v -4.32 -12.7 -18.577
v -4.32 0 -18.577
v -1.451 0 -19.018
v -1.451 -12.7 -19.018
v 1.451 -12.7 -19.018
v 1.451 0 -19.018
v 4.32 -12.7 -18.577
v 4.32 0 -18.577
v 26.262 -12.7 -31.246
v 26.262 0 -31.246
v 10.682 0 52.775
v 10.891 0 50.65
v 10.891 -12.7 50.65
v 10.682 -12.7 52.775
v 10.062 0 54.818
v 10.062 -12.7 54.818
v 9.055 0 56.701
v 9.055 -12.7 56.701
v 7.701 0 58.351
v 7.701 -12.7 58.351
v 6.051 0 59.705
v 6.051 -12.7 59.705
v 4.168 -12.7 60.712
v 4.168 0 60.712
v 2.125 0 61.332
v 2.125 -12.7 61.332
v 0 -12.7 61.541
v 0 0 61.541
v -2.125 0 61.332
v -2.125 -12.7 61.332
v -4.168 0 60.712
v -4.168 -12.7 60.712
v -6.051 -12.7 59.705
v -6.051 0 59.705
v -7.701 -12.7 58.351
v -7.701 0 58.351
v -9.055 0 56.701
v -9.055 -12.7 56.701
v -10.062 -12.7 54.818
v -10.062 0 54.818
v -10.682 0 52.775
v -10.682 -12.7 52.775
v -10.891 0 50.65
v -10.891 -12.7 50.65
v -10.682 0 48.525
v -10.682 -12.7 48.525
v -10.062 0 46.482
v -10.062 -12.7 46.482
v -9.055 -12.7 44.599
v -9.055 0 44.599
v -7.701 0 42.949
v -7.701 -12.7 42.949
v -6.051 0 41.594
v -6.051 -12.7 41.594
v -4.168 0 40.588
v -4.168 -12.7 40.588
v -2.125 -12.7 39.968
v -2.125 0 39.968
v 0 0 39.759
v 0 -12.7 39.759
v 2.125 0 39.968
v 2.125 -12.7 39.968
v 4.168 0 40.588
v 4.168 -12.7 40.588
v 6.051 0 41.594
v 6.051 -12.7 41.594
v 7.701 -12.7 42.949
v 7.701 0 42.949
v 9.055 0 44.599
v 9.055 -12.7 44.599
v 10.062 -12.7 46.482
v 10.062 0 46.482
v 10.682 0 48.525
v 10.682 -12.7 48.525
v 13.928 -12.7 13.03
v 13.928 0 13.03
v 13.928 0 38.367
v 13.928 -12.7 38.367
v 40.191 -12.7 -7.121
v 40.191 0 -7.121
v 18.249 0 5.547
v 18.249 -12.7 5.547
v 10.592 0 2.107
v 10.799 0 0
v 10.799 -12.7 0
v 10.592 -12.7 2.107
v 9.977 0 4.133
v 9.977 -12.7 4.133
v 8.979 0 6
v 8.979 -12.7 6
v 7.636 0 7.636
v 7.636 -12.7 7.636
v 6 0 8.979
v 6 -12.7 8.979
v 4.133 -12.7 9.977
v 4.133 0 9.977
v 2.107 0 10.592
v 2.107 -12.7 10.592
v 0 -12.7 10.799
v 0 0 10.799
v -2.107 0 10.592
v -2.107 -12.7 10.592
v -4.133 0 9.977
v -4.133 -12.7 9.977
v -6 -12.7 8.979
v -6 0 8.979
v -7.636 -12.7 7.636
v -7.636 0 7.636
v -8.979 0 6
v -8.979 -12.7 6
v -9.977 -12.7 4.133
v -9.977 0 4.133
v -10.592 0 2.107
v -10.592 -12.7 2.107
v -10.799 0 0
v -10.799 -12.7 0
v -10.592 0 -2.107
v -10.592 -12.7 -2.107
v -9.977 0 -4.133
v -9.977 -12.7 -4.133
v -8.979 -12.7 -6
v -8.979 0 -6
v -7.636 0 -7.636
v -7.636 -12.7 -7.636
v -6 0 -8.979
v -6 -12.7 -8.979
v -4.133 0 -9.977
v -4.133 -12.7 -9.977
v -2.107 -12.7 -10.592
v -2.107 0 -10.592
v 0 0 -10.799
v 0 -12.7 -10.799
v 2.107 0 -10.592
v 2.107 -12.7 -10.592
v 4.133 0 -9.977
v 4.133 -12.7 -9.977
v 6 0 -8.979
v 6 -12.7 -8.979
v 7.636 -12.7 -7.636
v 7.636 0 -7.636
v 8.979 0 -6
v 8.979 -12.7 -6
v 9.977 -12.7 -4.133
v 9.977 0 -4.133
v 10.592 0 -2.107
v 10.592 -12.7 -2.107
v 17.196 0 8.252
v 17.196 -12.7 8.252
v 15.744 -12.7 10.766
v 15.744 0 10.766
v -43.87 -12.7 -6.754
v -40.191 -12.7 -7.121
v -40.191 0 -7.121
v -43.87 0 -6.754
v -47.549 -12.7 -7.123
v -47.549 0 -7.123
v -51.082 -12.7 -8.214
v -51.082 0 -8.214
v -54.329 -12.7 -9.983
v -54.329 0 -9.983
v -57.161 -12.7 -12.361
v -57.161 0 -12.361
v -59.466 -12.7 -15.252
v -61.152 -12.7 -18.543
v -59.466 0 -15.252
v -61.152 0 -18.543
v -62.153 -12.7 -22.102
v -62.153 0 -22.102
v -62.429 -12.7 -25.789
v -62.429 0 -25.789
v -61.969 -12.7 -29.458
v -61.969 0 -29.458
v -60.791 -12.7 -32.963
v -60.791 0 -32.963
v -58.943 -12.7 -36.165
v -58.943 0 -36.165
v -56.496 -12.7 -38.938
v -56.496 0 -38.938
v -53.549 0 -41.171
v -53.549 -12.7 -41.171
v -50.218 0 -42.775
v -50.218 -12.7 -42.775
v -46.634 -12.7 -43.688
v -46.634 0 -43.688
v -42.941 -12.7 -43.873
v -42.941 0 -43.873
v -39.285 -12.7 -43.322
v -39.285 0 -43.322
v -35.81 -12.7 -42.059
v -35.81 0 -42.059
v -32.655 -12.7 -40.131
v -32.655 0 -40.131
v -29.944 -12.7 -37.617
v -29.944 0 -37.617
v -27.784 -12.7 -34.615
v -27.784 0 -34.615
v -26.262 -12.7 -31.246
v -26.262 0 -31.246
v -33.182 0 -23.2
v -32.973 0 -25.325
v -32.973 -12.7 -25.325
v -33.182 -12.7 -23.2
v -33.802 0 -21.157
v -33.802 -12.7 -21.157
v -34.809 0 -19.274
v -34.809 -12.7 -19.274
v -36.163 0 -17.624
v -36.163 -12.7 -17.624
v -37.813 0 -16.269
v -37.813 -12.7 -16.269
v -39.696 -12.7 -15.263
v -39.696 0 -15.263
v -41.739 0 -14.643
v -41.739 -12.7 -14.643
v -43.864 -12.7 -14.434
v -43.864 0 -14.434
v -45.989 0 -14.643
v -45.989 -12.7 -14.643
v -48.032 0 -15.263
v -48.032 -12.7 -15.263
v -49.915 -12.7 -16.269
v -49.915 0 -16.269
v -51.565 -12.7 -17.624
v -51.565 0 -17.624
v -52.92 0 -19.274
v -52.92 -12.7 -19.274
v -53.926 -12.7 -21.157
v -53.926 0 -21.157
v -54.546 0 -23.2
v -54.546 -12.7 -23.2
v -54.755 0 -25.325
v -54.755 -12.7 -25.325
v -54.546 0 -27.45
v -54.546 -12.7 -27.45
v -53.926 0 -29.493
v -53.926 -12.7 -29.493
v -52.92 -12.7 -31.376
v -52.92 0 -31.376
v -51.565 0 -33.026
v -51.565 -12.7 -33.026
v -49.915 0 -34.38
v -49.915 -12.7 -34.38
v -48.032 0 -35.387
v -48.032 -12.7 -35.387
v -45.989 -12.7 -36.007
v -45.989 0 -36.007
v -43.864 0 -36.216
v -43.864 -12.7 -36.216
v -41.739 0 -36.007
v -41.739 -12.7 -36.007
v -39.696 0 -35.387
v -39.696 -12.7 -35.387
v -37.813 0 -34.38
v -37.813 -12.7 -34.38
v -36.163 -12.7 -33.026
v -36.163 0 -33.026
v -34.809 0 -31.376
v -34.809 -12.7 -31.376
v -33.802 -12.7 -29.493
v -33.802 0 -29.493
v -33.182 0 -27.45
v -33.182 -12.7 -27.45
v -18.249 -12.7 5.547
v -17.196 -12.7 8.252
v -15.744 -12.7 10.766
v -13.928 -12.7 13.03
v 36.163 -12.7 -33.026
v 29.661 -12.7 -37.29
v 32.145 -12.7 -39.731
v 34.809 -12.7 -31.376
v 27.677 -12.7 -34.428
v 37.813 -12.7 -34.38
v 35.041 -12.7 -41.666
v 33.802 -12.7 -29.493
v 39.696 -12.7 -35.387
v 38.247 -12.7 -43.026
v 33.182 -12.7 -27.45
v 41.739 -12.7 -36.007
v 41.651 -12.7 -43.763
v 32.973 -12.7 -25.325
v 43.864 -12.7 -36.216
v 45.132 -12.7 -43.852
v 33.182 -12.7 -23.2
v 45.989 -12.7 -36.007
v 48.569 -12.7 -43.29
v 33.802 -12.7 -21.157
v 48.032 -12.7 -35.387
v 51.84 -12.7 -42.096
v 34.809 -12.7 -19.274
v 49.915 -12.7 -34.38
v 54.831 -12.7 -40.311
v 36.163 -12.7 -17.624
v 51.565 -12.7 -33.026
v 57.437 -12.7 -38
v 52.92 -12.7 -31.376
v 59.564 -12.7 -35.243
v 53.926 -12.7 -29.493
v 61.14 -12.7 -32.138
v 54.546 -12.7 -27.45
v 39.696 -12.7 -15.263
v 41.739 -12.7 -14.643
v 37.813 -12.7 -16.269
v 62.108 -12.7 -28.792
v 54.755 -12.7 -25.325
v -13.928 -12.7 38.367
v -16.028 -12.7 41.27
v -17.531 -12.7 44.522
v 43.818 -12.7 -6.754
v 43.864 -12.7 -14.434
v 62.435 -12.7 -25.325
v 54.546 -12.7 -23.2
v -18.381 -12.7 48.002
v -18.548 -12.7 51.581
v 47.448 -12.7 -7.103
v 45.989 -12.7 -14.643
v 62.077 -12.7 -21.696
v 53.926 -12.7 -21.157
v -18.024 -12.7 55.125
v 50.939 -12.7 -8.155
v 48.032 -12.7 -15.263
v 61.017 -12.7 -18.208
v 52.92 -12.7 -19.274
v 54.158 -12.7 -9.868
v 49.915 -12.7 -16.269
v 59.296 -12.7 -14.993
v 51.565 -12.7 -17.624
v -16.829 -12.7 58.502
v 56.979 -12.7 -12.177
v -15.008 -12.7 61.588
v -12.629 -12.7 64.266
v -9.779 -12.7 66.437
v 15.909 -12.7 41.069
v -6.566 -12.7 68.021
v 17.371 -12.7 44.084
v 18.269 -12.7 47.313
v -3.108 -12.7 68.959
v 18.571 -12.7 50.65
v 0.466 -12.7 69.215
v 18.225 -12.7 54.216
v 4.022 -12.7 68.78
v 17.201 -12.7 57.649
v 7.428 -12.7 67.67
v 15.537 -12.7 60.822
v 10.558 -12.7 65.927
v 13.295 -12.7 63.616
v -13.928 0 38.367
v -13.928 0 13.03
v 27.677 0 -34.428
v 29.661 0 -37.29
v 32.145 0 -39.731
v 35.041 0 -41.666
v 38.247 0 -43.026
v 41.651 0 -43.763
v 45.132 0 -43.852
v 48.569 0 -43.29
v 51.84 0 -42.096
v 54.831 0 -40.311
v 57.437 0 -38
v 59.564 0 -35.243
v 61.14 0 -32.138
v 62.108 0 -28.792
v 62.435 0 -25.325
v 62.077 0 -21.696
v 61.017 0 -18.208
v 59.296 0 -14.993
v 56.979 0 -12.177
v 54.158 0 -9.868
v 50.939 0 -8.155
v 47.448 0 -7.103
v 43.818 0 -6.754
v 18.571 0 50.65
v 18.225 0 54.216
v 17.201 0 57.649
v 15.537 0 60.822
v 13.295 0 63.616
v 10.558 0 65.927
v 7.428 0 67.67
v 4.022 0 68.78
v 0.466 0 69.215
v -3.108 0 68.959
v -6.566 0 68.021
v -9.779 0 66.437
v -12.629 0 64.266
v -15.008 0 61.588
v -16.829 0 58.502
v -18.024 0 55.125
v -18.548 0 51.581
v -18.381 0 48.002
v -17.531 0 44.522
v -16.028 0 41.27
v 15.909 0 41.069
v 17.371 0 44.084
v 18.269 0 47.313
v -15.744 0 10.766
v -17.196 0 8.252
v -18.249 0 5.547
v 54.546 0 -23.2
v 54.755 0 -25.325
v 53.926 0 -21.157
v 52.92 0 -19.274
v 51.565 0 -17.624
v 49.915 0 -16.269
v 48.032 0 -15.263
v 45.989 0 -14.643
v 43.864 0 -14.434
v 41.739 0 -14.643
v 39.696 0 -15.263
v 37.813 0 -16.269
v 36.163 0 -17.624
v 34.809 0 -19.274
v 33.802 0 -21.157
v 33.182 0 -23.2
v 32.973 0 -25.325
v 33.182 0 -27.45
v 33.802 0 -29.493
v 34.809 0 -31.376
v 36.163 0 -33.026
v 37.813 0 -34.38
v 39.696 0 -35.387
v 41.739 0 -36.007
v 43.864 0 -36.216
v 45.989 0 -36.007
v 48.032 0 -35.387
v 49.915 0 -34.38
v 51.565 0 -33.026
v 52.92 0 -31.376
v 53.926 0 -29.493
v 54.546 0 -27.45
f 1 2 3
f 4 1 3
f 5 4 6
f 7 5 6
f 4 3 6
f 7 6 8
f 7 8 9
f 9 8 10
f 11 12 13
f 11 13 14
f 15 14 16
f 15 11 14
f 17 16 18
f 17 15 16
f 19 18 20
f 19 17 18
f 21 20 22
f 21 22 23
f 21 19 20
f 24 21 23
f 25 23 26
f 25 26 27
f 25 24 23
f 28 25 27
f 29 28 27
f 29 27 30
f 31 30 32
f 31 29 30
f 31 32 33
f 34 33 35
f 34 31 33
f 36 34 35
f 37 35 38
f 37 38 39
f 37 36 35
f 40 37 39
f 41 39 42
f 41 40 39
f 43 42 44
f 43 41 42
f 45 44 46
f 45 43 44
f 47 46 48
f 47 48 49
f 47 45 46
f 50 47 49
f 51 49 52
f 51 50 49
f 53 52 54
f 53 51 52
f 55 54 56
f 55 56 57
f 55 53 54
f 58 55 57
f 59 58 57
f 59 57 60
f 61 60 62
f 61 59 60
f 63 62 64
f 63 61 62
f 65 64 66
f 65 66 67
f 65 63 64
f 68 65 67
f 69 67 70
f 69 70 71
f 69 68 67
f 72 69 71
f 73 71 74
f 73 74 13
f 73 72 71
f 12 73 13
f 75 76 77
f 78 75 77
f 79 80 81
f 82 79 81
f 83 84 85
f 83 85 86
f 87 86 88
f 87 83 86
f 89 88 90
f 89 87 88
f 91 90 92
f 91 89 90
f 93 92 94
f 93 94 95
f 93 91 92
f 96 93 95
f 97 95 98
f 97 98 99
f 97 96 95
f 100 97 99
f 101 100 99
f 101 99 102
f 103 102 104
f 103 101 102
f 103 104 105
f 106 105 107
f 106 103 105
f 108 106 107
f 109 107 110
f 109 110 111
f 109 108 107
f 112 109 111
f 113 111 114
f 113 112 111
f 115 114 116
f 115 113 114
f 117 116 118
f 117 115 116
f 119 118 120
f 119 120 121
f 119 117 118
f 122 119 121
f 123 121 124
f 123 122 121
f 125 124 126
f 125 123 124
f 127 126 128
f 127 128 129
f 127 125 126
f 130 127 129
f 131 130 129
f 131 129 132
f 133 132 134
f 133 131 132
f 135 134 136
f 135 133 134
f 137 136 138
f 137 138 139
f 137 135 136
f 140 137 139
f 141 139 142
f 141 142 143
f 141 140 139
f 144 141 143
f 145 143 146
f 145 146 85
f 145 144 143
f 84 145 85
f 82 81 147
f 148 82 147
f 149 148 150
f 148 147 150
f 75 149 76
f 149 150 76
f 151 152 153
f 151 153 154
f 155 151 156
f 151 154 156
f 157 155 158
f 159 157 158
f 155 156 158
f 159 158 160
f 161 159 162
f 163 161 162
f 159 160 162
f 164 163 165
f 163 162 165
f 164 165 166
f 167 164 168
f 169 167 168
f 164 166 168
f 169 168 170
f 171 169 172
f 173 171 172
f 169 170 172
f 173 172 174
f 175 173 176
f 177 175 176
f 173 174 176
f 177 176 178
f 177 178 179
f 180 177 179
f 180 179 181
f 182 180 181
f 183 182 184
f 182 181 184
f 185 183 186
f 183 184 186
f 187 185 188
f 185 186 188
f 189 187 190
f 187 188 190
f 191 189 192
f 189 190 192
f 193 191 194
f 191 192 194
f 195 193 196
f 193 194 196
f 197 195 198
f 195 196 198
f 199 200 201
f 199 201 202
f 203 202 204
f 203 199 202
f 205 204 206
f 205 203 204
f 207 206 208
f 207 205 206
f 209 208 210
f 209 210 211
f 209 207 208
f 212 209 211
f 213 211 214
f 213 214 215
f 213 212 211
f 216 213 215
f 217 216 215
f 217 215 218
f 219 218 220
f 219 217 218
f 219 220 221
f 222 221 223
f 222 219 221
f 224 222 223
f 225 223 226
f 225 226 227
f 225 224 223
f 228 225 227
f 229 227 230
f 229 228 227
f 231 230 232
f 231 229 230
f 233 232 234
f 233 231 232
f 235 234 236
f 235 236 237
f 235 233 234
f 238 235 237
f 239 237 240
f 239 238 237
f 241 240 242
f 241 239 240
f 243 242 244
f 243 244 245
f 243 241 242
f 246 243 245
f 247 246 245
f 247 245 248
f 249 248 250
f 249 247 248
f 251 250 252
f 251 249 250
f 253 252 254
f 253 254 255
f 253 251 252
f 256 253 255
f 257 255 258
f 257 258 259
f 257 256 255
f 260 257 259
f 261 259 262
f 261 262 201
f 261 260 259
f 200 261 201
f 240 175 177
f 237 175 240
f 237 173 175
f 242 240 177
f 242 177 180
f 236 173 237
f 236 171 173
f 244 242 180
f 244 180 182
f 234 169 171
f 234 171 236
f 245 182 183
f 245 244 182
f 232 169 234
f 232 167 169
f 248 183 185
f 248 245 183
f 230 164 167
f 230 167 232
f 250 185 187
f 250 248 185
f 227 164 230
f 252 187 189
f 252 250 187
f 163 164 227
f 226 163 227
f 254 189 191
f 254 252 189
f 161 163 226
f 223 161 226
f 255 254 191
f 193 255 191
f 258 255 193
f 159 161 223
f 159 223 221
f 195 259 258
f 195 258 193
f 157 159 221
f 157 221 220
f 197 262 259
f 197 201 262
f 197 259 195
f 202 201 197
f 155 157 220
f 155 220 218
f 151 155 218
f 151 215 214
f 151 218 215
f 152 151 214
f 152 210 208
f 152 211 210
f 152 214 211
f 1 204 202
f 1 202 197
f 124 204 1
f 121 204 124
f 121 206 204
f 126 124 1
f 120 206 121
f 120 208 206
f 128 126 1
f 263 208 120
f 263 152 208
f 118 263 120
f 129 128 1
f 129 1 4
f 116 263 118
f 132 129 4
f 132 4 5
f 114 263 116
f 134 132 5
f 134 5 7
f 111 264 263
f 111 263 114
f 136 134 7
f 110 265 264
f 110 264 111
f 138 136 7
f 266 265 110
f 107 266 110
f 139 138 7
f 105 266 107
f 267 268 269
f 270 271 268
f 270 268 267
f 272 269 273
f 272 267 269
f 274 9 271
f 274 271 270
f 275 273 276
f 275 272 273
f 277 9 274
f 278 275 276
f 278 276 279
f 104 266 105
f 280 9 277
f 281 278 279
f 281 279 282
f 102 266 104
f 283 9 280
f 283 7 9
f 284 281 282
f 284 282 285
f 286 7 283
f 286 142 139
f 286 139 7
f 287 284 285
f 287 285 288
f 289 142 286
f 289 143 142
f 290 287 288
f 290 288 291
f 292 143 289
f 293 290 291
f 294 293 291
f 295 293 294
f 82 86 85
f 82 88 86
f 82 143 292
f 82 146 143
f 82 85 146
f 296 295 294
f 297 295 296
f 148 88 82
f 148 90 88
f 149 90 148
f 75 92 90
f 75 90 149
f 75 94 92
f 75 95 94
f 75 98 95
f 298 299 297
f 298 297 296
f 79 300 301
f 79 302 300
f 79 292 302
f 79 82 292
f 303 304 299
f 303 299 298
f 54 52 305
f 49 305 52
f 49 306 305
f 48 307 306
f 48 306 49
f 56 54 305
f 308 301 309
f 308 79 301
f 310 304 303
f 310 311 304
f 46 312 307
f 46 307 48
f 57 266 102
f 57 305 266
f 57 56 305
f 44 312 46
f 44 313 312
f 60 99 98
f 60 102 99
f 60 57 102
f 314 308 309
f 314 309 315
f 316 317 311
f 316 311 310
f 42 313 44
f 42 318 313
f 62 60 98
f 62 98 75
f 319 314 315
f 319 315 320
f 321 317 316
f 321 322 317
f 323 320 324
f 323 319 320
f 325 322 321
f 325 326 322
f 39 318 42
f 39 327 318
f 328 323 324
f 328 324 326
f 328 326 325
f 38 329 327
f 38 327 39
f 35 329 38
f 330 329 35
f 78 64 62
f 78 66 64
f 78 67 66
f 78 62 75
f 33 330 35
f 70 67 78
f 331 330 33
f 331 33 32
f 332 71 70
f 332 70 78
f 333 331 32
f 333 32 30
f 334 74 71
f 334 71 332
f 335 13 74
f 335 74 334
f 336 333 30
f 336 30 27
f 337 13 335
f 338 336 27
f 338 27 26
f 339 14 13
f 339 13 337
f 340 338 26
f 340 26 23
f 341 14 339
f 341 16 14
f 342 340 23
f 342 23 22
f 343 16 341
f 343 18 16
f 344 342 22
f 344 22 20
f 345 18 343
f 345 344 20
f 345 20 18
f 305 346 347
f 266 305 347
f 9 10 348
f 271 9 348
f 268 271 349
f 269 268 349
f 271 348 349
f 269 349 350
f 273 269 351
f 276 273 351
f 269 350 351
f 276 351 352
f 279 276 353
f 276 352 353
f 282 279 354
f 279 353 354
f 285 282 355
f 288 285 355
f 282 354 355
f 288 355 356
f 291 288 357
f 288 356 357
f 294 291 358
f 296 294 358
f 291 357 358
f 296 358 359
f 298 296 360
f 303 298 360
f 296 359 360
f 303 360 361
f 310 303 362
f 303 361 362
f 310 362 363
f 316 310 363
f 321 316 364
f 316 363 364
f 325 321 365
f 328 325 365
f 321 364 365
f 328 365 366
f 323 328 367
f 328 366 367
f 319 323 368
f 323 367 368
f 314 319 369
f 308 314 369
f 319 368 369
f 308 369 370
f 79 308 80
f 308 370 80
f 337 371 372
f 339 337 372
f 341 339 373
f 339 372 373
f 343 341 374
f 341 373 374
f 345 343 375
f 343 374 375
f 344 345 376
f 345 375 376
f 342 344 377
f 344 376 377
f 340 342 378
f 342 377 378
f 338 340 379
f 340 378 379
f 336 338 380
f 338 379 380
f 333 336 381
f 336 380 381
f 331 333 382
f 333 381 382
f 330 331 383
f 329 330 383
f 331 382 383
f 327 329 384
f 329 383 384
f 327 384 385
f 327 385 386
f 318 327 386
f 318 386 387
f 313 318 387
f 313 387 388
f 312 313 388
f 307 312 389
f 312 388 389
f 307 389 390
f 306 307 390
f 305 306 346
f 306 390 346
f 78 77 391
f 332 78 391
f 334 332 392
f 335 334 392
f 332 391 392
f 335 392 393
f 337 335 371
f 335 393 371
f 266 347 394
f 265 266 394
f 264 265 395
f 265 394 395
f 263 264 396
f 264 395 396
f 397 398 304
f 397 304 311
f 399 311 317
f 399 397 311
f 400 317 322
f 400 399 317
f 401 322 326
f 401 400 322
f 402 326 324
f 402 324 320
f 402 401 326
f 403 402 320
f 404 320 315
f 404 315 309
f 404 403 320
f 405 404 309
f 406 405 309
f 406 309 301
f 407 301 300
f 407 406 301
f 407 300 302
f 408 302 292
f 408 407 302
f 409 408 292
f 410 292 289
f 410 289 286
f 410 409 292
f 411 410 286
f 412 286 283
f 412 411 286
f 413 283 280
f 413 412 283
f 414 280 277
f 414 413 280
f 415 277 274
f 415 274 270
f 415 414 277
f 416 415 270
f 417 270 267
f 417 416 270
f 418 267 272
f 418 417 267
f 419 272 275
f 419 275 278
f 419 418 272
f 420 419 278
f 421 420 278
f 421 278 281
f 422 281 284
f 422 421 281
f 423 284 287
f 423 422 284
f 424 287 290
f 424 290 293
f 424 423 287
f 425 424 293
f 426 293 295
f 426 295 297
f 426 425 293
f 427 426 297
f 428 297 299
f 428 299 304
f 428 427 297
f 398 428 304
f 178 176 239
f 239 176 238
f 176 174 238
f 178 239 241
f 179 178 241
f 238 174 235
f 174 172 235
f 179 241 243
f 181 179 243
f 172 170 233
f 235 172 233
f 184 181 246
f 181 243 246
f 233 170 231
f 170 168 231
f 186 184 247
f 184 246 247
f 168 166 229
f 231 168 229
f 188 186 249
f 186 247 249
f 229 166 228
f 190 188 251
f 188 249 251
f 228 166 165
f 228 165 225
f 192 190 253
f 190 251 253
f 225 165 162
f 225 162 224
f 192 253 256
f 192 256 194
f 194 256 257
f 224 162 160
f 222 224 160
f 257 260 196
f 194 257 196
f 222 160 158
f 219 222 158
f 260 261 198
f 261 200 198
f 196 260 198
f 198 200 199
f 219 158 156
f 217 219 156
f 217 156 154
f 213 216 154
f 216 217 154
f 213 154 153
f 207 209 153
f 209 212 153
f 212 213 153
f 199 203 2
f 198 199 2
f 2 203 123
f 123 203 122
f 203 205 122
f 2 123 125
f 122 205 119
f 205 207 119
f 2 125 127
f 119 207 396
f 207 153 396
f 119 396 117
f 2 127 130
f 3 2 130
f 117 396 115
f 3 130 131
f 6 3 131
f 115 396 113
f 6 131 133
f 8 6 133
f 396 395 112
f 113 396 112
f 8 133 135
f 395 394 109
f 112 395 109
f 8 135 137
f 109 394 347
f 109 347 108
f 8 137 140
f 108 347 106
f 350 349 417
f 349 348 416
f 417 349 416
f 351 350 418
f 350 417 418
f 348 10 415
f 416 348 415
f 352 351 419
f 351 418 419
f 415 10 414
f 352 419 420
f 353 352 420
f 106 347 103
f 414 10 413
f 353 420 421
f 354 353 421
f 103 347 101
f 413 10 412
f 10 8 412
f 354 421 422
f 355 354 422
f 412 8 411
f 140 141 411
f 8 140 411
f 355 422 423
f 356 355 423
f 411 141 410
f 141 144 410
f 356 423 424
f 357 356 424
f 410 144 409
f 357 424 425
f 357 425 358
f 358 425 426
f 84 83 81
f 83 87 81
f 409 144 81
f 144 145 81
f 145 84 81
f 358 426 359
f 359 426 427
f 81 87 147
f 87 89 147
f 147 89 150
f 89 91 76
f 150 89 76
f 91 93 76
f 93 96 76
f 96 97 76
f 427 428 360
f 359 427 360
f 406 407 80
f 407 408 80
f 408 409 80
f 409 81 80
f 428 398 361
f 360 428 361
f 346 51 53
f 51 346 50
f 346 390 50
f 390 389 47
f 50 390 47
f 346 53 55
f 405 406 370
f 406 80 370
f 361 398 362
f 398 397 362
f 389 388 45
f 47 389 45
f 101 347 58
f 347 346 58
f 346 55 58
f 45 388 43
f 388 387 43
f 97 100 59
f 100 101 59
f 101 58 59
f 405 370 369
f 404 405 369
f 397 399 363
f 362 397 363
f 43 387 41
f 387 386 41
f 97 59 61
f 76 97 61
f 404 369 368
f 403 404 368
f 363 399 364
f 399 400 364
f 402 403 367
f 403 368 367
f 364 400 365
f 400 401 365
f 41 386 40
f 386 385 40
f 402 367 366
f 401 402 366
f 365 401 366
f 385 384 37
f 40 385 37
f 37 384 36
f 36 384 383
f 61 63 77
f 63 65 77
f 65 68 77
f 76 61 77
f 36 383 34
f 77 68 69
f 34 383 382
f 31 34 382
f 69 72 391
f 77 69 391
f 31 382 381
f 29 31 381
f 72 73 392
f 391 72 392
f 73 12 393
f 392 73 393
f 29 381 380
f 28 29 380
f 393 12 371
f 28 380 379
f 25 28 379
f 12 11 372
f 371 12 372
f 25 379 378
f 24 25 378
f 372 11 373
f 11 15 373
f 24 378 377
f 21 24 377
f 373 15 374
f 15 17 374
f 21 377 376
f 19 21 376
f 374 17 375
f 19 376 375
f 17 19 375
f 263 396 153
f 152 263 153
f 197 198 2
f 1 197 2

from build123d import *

# Parameters (mm, degrees)
F0_R     = 10.890936
F0_R_2   = 10.799032
F1_DEPTH = 12.7


with BuildPart() as f1:
    # F0 (on Front) → F1 (new body)
    with BuildSketch(Plane.XZ):
        with BuildLine():
            ThreePointArc((13.928364, 38.366641), (17.3715, 44.084221), (18.57085, 50.649848))
            ThreePointArc((18.57085, 50.649848), (-6.565627, 68.021348), (-13.928364, 38.366641))
            ThreePointArc((-13.928364, 38.366641), (0, 32.078998), (13.928364, 38.366641))
        make_face()
        with Locations((0, 50.649848)):
            Circle(F0_R, mode=Mode.SUBTRACT)
        with BuildLine():
            ThreePointArc((13.928364, 38.366641), (0, 32.078998), (-13.928364, 38.366641))
            Line((-13.928364, 38.366641), (-13.928364, 13.030285))
            ThreePointArc((-13.928364, 13.030285), (0, 19.073218), (13.928364, 13.030285))
            Line((13.928364, 13.030285), (13.928364, 38.366641))
        make_face()
        with BuildLine():
            ThreePointArc((-4.320376, -18.577459), (-16.517891, -9.536609), (-18.248739, 5.547174))
            Line((-18.248739, 5.547174), (-40.190668, -7.121004))
            ThreePointArc((-40.190668, -7.121004), (-29.492305, -13.563577), (-25.293205, -25.324924))
            ThreePointArc((-25.293205, -25.324924), (-25.537081, -28.324674), (-26.262304, -31.245637))
            Line((-26.262304, -31.245637), (-4.320376, -18.577459))
        make_face()
        with BuildLine():
            ThreePointArc((13.928364, 13.030285), (0, 19.073218), (-13.928364, 13.030285))
            ThreePointArc((-13.928364, 13.030285), (-16.517891, 9.536609), (-18.248739, 5.547174))
            ThreePointArc((-18.248739, 5.547174), (-16.517891, -9.536609), (-4.320376, -18.577459))
            ThreePointArc((-4.320376, -18.577459), (0, -19.073218), (4.320376, -18.577459))
            ThreePointArc((4.320376, -18.577459), (14.936383, -11.861369), (19.073218, 0))
            ThreePointArc((19.073218, 0), (18.865972, 2.804055), (18.248739, 5.547174))
            ThreePointArc((18.248739, 5.547174), (16.517891, 9.536609), (13.928364, 13.030285))
        make_face()
        Circle(F0_R_2, mode=Mode.SUBTRACT)
        with BuildLine():
            ThreePointArc((-25.293205, -25.324924), (-29.492305, -13.563577), (-40.190668, -7.121004))
            ThreePointArc((-40.190668, -7.121004), (-59.946883, -34.610349), (-26.262304, -31.245637))
            ThreePointArc((-26.262304, -31.245637), (-25.537081, -28.324674), (-25.293205, -25.324924))
        make_face()
        with Locations((-43.864055, -25.324924)):
            Circle(F0_R, mode=Mode.SUBTRACT)
        with BuildLine():
            Line((40.190668, -7.121004), (18.248739, 5.547174))
            ThreePointArc((18.248739, 5.547174), (18.865972, 2.804055), (19.073218, 0))
            ThreePointArc((19.073218, 0), (14.936383, -11.861369), (4.320376, -18.577459))
            Line((4.320376, -18.577459), (26.262304, -31.245637))
            ThreePointArc((26.262304, -31.245637), (27.781227, -16.039499), (40.190668, -7.121004))
        make_face()
        with BuildLine():
            ThreePointArc((62.434905, -25.324924), (55.625402, -10.953174), (40.190668, -7.121004))
            ThreePointArc((40.190668, -7.121004), (27.781227, -16.039499), (26.262304, -31.245637))
            ThreePointArc((26.262304, -31.245637), (46.863805, -43.651898), (62.434905, -25.324924))
        make_face()
        with Locations((43.864055, -25.324924)):
            Circle(F0_R, mode=Mode.SUBTRACT)
    extrude(amount=F1_DEPTH)


solid = f1.part
